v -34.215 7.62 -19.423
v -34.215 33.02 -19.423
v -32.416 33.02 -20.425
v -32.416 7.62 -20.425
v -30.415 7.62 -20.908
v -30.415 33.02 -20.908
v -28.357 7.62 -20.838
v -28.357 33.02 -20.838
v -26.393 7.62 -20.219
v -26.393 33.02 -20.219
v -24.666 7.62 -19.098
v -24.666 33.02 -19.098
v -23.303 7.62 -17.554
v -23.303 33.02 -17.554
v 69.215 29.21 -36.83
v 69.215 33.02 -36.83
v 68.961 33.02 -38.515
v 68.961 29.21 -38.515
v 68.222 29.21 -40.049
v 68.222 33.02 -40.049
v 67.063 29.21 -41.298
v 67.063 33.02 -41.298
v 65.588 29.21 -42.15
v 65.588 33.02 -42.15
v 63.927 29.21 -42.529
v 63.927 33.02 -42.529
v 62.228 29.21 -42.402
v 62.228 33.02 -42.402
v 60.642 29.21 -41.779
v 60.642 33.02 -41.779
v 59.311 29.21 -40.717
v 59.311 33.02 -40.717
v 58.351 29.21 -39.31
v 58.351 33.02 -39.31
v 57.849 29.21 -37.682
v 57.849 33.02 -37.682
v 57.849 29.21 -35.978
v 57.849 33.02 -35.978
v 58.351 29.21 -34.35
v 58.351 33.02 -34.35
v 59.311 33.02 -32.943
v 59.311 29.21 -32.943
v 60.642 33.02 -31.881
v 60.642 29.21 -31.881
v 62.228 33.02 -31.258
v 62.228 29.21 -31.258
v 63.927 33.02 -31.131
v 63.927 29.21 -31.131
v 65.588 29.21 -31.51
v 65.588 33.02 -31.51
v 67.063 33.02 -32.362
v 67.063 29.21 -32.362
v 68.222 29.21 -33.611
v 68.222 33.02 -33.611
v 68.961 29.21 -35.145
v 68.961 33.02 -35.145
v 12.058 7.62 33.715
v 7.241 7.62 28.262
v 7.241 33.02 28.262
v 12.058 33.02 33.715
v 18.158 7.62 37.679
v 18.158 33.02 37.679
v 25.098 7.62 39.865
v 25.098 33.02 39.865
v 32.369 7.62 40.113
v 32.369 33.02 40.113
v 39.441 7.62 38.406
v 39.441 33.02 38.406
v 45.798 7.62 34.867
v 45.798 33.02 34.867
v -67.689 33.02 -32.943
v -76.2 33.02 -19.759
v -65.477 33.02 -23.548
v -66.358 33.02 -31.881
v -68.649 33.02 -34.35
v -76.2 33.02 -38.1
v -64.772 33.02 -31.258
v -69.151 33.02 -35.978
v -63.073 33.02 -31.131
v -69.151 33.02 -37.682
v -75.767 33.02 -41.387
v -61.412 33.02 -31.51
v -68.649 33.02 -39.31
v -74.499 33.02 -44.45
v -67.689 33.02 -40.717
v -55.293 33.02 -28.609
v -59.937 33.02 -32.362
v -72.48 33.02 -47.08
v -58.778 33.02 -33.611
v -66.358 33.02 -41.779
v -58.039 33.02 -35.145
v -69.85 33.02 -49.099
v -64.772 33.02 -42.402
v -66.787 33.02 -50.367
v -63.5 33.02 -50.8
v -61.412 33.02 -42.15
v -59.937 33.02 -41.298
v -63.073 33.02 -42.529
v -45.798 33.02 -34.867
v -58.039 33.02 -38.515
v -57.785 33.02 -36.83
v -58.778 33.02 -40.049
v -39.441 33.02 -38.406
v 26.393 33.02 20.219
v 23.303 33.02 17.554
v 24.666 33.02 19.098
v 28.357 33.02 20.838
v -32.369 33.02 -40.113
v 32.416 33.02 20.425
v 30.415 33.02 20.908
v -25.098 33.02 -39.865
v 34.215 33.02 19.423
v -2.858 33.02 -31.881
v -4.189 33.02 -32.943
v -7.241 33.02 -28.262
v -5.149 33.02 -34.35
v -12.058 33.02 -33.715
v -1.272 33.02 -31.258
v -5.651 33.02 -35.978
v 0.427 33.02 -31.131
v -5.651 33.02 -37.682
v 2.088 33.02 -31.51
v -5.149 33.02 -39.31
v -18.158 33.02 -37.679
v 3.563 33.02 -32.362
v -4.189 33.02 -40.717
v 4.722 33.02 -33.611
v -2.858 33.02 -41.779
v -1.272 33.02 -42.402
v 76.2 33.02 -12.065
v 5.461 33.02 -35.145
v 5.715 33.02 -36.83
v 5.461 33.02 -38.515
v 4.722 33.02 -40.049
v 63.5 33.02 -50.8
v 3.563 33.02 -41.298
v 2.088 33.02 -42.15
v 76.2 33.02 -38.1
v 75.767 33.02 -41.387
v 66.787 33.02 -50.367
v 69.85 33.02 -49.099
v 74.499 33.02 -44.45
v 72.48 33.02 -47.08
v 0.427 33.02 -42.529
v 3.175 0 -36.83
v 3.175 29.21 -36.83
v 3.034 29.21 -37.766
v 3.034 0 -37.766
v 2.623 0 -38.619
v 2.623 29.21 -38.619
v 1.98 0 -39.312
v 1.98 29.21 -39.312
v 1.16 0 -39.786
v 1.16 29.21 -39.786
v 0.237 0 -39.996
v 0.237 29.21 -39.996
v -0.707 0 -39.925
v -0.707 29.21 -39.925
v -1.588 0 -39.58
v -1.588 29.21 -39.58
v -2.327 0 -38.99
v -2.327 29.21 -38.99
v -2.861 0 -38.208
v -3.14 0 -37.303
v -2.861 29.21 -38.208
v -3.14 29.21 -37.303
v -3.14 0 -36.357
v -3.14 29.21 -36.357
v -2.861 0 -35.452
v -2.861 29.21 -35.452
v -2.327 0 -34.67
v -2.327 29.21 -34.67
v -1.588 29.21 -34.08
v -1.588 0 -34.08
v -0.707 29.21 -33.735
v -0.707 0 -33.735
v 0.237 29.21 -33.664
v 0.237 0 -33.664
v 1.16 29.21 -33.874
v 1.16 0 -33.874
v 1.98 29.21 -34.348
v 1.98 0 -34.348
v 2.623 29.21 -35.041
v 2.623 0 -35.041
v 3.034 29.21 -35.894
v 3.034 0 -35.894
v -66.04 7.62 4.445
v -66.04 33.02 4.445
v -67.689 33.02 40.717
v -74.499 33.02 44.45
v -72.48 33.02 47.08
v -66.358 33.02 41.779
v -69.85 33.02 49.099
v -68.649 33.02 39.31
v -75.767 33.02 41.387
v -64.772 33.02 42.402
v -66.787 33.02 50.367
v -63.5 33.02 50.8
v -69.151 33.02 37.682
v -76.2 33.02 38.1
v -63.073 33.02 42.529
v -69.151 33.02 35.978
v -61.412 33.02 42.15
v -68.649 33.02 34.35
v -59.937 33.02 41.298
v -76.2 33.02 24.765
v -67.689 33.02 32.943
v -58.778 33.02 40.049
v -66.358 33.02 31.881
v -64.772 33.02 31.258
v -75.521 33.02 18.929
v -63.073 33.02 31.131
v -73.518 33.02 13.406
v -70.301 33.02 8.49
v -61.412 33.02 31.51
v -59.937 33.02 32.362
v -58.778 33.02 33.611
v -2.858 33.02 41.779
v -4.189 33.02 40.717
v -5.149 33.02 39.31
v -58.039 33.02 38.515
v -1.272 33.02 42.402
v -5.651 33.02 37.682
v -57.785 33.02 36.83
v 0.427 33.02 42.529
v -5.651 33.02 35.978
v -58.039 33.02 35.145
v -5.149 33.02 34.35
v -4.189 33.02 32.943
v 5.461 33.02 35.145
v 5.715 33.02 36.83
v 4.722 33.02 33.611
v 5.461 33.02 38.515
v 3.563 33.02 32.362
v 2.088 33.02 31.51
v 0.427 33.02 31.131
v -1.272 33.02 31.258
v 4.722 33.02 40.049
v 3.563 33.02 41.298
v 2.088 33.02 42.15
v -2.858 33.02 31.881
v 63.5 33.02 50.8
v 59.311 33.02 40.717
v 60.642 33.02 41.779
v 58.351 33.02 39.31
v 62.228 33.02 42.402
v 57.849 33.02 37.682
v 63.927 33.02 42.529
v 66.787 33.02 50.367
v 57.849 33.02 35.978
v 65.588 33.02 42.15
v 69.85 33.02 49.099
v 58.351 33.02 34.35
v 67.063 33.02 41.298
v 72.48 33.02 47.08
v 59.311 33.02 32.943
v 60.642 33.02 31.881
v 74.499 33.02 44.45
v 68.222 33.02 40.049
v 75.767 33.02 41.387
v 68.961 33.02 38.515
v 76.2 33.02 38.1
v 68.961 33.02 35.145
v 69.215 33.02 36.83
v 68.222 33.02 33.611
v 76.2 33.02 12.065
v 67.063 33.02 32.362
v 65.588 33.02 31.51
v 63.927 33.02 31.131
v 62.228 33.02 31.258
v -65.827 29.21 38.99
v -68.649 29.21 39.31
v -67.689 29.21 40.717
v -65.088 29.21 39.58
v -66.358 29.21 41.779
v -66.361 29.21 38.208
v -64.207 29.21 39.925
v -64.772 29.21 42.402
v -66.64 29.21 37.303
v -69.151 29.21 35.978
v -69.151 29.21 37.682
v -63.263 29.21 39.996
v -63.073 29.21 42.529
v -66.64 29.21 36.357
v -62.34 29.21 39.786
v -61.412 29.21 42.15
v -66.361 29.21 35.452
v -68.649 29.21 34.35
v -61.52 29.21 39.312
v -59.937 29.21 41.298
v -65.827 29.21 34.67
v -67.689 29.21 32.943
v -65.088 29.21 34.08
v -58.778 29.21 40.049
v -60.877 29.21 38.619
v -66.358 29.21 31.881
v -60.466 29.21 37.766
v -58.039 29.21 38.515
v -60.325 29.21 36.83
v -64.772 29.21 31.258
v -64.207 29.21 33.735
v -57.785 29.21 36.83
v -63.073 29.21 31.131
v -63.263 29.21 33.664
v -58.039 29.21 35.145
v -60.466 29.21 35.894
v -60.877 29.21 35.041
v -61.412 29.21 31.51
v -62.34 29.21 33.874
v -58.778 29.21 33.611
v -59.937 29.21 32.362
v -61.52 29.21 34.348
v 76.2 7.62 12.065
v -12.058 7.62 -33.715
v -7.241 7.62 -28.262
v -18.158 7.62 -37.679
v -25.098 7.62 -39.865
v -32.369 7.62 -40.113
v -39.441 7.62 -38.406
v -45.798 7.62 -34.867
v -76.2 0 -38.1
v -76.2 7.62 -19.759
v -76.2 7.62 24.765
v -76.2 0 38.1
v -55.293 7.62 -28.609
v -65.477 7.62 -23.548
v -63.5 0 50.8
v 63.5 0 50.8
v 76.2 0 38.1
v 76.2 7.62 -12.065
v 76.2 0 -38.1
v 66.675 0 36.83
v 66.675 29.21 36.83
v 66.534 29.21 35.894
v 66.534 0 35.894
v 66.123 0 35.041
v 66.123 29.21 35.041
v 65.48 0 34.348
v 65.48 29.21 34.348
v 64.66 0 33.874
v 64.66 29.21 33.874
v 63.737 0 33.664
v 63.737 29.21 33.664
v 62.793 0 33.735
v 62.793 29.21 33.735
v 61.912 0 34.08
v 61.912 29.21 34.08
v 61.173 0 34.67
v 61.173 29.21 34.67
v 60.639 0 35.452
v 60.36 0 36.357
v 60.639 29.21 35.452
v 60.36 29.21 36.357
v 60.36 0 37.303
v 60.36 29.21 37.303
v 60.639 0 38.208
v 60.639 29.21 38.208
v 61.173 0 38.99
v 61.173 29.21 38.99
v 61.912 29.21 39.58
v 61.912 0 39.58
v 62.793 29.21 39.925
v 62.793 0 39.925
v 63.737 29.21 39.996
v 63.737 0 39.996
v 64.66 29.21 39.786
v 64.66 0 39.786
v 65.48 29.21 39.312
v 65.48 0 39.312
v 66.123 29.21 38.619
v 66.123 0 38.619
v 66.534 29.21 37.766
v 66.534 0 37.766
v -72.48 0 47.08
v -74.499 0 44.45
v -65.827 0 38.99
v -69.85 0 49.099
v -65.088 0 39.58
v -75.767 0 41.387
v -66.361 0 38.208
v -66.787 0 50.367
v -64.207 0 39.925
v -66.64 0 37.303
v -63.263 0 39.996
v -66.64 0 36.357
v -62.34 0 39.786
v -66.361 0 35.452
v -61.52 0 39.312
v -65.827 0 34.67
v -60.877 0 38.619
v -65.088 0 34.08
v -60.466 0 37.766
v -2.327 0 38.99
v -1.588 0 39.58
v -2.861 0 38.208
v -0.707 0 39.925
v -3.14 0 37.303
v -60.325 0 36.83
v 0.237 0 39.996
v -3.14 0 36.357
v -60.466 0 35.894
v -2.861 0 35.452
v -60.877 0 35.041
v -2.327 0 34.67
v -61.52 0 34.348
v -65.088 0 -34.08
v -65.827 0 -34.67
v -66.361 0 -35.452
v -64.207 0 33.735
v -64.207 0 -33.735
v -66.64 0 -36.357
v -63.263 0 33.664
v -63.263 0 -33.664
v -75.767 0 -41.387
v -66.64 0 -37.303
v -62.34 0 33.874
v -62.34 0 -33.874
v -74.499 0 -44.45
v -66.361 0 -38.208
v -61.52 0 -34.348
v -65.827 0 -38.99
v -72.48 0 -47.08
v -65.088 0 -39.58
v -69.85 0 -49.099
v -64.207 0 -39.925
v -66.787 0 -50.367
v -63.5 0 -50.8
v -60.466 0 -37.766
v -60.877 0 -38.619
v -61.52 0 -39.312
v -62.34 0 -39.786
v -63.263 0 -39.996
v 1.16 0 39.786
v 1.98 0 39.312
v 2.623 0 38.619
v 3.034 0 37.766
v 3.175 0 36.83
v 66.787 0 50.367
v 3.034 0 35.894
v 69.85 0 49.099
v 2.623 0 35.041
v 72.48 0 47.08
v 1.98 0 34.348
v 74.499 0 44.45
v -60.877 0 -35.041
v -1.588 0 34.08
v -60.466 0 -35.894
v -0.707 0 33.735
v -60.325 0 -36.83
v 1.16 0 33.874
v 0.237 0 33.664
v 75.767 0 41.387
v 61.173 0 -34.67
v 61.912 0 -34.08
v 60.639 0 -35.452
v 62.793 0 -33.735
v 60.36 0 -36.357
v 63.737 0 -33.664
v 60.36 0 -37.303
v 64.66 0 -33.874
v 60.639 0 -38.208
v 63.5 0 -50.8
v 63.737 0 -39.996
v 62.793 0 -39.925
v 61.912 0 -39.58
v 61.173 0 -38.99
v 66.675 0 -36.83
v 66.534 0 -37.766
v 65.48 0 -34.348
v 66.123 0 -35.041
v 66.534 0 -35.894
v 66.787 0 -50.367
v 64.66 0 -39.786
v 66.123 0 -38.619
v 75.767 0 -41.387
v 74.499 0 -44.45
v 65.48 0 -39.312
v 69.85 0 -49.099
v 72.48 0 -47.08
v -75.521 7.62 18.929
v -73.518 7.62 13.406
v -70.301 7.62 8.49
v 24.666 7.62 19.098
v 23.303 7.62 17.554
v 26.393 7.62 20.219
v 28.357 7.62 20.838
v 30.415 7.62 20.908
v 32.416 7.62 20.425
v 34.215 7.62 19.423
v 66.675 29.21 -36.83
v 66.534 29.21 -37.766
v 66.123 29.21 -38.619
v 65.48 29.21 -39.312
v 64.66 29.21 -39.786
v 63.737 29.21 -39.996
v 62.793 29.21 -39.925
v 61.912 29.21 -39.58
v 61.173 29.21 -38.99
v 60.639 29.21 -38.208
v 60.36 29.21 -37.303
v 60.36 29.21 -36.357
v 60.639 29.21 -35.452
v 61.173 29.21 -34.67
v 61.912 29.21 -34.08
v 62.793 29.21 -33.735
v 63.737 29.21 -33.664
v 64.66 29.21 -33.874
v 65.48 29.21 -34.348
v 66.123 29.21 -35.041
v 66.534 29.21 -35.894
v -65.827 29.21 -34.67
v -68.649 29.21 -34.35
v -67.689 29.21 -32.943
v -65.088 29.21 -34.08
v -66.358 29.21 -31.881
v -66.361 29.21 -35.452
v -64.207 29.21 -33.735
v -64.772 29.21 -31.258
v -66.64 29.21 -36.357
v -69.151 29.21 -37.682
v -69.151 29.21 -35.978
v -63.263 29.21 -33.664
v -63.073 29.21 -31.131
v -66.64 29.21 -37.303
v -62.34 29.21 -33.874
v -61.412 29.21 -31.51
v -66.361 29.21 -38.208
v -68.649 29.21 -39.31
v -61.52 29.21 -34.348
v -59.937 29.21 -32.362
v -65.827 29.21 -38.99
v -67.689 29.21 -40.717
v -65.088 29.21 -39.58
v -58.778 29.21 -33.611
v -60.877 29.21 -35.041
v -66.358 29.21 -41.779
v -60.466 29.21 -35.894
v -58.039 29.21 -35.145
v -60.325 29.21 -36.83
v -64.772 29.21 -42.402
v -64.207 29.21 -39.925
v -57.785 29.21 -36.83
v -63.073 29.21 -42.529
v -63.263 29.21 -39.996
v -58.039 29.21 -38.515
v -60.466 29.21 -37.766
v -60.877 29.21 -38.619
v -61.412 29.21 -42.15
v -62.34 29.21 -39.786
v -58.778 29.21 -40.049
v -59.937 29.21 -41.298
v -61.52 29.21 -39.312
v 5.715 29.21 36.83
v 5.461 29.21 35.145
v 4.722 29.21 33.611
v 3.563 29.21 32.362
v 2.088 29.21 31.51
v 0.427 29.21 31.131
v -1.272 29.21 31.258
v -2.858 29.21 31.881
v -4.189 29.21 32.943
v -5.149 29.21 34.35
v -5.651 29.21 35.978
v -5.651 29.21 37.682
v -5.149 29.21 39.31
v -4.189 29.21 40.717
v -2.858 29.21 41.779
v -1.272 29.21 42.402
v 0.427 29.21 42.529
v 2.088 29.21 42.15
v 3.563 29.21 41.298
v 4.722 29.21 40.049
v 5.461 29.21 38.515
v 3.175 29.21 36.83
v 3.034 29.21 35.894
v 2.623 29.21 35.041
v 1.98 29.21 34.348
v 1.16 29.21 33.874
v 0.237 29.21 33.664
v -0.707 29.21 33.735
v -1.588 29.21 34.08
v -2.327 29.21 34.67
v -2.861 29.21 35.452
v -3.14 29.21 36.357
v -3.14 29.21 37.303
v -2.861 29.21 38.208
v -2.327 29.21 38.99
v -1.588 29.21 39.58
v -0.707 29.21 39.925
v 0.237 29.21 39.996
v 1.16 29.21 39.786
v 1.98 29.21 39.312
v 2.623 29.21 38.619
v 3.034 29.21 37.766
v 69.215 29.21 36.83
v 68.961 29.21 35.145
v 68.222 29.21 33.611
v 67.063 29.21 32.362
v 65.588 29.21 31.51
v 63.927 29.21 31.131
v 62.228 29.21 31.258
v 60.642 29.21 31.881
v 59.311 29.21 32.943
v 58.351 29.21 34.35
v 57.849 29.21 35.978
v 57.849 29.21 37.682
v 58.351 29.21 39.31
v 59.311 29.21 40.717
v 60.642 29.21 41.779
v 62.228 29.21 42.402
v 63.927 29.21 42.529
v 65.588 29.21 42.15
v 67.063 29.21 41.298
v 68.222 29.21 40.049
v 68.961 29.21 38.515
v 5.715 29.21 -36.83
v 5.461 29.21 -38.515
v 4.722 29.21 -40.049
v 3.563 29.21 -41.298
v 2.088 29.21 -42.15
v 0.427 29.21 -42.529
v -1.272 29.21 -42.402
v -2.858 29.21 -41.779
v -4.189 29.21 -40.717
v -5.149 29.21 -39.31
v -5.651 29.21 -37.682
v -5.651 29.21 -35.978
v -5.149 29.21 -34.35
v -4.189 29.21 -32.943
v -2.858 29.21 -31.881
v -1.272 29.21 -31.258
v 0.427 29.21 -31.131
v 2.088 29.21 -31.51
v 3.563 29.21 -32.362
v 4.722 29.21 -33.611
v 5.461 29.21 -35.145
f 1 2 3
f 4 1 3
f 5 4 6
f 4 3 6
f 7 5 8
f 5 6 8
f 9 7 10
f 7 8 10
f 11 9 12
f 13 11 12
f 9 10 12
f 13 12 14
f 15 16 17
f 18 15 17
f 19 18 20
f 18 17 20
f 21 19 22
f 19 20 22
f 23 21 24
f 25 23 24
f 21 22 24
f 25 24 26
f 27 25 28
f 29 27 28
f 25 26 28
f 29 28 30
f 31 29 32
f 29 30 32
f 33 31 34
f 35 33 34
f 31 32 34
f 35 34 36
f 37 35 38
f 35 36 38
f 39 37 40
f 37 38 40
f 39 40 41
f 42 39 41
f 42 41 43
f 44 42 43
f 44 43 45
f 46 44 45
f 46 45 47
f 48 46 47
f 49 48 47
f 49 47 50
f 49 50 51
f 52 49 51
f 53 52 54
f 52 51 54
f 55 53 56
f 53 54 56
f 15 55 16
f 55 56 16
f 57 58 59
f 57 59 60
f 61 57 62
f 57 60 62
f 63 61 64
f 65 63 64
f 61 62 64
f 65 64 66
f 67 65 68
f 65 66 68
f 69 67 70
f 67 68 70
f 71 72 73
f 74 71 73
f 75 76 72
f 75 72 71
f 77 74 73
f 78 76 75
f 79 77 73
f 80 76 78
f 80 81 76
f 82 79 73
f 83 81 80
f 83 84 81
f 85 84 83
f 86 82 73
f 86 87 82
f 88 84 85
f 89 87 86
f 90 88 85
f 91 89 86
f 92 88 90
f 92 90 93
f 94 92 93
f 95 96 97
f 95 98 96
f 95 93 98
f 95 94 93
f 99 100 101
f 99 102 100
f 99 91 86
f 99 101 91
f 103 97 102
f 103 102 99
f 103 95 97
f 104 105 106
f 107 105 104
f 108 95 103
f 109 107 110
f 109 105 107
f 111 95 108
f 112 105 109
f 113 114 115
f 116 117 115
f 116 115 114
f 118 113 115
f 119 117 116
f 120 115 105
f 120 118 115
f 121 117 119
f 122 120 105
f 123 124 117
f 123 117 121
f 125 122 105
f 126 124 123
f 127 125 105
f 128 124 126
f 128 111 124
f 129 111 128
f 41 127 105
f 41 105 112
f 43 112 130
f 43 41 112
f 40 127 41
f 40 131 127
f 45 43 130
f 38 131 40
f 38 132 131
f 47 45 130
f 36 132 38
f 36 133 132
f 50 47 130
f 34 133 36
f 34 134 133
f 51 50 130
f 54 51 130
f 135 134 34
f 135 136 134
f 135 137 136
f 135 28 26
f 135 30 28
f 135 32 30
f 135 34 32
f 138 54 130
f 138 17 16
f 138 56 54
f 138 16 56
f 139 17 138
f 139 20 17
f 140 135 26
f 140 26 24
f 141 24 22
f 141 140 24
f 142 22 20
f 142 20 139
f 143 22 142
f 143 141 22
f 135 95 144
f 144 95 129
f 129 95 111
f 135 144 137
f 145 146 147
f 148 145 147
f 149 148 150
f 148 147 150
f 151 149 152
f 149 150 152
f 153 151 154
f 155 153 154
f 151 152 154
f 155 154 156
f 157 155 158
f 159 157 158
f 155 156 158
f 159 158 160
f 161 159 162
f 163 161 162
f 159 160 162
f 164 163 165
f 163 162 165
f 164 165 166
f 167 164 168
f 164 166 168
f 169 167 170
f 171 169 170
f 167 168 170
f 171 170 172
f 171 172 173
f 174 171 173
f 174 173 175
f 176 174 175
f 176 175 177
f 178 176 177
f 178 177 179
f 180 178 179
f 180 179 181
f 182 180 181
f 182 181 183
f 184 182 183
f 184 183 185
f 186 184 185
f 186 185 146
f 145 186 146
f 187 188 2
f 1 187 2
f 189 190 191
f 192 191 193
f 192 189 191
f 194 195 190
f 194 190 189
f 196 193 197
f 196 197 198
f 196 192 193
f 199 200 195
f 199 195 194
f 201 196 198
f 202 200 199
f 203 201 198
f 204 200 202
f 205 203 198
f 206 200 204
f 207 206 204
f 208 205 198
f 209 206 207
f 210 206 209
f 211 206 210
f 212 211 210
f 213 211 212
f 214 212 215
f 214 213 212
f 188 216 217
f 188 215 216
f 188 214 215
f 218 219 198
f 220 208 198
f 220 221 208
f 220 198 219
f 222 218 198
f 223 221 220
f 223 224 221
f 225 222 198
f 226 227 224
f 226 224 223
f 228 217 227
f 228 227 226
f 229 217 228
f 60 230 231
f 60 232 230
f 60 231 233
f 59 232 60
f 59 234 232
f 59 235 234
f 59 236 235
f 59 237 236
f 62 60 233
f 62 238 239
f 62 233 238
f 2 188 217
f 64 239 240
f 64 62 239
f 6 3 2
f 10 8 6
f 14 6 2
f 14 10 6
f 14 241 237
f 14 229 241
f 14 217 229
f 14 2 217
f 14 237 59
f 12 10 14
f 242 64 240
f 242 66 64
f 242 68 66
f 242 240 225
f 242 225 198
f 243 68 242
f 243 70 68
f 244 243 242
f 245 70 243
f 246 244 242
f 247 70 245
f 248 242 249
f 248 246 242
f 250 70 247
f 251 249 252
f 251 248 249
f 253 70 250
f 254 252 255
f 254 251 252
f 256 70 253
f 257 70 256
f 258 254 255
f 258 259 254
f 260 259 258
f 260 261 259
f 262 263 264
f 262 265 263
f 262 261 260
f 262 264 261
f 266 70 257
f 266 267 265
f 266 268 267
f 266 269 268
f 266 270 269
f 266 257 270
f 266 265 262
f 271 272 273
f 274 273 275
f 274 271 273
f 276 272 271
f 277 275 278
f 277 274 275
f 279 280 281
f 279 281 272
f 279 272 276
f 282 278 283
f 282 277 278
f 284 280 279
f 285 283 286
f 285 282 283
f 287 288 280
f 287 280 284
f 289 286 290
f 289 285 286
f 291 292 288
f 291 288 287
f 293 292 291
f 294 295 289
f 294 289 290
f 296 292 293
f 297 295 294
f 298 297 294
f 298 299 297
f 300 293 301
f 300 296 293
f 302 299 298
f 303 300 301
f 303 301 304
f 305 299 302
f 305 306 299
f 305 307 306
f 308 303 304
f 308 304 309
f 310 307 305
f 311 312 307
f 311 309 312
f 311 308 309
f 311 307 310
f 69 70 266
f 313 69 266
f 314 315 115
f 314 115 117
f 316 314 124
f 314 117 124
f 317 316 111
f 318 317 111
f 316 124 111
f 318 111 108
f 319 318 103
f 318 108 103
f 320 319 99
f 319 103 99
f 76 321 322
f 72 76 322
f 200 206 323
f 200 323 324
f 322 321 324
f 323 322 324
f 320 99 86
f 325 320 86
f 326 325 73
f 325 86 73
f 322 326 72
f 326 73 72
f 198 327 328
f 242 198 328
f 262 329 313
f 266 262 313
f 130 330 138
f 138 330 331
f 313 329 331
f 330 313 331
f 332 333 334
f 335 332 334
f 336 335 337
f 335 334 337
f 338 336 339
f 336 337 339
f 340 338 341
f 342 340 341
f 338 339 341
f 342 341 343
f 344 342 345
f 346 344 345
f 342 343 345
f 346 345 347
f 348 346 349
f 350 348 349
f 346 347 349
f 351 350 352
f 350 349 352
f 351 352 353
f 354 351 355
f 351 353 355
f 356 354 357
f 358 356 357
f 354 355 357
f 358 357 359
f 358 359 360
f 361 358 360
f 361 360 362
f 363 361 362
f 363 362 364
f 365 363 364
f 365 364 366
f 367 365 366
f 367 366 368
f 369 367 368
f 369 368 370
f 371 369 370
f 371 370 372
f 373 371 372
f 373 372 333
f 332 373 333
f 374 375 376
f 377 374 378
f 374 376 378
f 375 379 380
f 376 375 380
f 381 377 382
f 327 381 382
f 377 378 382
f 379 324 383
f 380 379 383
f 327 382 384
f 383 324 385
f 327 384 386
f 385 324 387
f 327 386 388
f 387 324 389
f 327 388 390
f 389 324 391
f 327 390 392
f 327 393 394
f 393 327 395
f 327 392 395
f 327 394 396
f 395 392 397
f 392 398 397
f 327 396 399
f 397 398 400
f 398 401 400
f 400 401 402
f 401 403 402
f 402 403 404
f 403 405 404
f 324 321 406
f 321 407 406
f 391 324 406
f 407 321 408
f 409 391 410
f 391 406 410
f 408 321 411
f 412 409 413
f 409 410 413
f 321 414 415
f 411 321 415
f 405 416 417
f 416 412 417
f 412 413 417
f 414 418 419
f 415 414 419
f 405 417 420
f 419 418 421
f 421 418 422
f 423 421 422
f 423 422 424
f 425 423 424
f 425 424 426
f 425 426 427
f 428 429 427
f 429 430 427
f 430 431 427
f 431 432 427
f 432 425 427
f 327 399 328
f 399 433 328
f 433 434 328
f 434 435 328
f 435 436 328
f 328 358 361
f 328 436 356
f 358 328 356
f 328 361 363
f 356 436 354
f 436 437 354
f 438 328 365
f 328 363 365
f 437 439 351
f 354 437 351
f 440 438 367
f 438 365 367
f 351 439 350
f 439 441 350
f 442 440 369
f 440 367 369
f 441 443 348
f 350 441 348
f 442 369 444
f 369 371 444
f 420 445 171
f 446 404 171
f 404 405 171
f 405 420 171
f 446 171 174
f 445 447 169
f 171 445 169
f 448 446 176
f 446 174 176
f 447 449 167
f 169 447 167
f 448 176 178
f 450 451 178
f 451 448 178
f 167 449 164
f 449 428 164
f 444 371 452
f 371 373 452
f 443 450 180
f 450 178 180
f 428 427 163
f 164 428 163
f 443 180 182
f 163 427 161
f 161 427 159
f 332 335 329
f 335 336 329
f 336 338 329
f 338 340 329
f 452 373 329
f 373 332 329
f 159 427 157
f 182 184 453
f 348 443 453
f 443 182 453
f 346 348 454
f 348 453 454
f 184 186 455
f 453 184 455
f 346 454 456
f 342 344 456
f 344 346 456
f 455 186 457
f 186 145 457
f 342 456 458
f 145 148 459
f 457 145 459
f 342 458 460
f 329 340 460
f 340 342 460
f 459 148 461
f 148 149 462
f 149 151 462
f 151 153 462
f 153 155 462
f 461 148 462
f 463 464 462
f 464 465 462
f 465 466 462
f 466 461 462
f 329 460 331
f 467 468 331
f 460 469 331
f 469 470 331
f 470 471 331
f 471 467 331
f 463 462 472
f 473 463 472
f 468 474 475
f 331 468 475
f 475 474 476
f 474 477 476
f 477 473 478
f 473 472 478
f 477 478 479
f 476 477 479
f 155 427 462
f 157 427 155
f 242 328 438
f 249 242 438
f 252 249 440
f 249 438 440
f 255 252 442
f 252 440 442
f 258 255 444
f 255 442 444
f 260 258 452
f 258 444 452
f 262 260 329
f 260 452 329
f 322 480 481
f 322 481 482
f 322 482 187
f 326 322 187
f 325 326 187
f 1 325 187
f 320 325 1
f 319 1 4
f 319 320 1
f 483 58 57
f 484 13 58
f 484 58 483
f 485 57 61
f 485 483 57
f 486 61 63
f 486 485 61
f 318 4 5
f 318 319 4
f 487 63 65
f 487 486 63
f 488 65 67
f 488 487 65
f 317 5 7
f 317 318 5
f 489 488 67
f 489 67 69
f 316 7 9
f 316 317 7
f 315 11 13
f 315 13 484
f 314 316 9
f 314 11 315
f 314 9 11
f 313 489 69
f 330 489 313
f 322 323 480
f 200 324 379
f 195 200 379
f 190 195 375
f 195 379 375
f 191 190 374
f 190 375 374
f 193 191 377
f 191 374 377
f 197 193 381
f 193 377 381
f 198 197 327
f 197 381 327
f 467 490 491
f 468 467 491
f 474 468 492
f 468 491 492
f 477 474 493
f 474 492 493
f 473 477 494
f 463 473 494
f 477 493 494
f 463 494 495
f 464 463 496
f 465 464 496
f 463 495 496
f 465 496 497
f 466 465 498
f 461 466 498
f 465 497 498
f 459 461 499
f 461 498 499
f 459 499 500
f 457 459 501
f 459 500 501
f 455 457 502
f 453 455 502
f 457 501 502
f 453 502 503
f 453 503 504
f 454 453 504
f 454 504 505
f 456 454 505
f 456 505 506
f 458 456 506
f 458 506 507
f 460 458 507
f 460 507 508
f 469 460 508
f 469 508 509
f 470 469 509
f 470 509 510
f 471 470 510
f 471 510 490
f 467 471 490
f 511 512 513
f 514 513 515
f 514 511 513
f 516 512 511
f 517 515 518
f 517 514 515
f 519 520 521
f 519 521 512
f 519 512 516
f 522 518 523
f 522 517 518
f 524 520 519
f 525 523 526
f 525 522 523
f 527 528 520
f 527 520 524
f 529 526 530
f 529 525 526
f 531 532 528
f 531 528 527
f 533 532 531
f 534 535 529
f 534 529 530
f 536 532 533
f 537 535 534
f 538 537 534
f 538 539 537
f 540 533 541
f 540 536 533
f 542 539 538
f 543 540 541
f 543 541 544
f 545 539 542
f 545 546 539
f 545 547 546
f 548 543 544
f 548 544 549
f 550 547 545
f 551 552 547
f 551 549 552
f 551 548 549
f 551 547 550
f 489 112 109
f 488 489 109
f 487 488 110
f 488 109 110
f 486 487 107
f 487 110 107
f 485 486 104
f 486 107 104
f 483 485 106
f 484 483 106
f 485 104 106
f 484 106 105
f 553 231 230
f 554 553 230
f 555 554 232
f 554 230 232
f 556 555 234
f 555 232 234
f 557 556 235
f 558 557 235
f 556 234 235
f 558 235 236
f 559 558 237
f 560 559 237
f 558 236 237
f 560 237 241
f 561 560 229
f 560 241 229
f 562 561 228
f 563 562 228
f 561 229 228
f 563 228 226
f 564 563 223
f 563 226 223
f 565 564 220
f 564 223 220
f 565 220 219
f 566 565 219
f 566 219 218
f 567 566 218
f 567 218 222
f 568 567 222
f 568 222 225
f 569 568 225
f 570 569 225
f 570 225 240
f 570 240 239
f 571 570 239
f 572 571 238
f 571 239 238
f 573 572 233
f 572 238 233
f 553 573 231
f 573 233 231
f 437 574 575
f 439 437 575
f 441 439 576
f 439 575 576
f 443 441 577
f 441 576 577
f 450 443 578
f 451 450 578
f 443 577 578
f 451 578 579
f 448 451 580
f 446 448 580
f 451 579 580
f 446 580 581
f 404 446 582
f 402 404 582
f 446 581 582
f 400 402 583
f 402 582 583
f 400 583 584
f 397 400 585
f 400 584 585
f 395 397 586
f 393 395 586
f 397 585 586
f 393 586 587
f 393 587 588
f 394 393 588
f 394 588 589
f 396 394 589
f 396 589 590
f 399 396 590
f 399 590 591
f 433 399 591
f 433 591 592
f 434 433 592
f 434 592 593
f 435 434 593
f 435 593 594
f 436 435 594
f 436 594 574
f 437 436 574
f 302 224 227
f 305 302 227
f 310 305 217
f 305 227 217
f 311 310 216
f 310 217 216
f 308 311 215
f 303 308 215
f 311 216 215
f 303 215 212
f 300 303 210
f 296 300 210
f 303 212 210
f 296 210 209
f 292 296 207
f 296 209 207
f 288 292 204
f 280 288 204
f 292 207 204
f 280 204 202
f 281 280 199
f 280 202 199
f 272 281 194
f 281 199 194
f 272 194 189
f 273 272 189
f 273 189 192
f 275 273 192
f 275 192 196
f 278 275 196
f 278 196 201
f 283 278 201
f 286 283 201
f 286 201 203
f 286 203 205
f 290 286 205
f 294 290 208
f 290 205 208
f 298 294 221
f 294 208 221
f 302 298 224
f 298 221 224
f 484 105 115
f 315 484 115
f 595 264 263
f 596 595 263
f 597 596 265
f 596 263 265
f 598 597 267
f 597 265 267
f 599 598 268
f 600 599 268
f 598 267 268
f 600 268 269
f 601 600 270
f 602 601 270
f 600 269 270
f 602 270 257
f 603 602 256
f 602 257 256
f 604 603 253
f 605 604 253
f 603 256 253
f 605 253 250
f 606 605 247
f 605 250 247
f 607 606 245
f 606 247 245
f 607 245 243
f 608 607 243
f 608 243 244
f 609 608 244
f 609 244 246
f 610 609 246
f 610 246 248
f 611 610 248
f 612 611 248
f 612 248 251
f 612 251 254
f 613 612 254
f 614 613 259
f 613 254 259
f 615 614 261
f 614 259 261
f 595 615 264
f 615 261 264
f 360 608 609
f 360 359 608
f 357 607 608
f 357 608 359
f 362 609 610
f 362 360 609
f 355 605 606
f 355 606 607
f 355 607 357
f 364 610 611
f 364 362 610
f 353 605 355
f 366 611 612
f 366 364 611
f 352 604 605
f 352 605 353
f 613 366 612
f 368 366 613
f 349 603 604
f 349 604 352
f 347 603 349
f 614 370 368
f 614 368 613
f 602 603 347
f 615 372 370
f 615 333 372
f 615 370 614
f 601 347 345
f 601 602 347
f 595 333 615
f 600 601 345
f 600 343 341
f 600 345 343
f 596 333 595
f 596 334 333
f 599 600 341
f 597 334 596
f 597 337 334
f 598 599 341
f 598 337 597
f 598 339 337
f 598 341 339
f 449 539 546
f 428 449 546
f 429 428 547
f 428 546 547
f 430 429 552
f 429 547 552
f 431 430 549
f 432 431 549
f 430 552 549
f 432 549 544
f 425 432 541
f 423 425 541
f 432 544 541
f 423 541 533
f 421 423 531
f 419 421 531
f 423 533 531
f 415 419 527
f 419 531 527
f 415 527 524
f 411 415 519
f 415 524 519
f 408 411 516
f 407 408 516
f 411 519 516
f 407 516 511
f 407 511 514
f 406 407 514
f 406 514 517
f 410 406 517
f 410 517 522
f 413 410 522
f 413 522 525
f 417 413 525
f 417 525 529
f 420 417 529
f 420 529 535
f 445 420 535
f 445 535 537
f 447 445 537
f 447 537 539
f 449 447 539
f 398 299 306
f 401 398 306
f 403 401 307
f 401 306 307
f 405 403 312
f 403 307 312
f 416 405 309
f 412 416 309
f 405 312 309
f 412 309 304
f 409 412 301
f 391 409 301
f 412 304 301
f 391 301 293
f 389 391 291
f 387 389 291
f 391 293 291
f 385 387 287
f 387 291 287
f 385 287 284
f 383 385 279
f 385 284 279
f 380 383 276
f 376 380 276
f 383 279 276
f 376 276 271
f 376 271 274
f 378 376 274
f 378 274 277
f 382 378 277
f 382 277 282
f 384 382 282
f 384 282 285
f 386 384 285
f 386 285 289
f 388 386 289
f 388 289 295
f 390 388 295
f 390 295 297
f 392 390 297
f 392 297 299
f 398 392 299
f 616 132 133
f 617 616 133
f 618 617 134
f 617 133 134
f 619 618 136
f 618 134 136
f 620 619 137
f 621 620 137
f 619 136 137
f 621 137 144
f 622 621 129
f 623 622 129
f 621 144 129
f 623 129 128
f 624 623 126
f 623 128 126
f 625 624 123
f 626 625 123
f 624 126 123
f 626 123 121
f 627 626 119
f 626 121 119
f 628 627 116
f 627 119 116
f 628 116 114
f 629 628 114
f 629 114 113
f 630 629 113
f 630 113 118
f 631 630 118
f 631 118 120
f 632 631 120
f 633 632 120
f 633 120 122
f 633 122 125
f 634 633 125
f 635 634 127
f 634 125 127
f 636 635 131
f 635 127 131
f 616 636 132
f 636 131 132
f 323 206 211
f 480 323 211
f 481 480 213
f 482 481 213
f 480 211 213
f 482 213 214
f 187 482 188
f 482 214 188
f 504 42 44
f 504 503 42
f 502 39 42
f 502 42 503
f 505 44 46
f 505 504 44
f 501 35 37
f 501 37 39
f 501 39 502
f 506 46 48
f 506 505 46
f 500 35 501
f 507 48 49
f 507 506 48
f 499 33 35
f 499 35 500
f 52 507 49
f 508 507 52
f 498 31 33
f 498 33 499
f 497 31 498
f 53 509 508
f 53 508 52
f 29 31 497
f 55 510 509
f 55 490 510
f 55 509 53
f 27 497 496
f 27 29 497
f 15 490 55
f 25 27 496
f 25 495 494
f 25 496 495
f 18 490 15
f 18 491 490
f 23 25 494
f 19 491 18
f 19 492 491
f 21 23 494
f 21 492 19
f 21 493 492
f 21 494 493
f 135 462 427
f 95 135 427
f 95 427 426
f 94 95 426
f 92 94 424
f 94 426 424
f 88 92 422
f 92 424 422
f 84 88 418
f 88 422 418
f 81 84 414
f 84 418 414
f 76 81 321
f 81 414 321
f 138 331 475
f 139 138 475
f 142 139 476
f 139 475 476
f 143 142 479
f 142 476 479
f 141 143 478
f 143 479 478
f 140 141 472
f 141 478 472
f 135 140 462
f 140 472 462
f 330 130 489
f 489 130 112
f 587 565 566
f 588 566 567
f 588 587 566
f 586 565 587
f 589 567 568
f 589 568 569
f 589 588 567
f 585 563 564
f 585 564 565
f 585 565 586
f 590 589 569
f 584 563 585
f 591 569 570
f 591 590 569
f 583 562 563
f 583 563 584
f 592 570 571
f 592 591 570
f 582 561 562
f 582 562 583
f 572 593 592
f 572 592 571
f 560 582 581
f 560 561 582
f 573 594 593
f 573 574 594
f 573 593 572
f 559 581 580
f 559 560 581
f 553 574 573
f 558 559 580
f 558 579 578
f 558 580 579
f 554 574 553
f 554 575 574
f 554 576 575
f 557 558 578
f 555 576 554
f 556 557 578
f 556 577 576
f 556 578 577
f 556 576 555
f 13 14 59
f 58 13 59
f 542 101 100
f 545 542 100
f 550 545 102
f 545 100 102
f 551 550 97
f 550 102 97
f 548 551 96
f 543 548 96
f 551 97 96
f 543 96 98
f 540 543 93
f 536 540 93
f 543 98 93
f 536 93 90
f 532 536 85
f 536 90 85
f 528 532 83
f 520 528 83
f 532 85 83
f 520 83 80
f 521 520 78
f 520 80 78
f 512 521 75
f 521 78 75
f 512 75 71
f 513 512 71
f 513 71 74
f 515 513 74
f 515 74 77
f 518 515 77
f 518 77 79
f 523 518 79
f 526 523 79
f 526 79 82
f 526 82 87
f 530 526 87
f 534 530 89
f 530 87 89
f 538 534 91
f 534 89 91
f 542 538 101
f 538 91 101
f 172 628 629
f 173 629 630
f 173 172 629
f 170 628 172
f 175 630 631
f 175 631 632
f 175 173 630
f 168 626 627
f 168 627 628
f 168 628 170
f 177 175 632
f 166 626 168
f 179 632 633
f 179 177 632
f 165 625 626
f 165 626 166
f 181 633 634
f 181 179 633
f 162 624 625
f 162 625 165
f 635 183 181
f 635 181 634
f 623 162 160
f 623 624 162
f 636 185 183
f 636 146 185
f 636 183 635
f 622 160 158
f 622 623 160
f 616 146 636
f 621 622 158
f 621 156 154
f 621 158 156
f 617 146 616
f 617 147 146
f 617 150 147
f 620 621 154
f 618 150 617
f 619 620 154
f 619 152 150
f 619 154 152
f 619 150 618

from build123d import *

# Parameters (mm, degrees)
BOSS_EXTRUDE1_DEPTH = 33.02
CUT_EXTRUDE1_DEPTH  = 25.4
SKETCH3_R           = 3.175
CUT_EXTRUDE2_DEPTH  = 34.02
SKETCH4_R           = 5.715
CUT_EXTRUDE3_DEPTH  = 3.81


with BuildPart() as part:
    # Sketch1 → Boss-Extrude1 (new body)
    with BuildSketch(Plane(origin=(0, 0, 0), x_dir=(1, 0, 0), z_dir=(0, 1, 0))):
        with BuildLine():
            Line((-63.5, -50.8), (63.5, -50.8))
            ThreePointArc((63.5, -50.8), (72.480256121, -47.080256121), (76.2, -38.1))
            Line((76.2, -38.1), (76.2, 38.1))
            ThreePointArc((76.2, 38.1), (72.480256121, 47.080256121), (63.5, 50.8))
            Line((63.5, 50.8), (-63.5, 50.8))
            ThreePointArc((-63.5, 50.8), (-72.480256121, 47.080256121), (-76.2, 38.1))
            Line((-76.2, 38.1), (-76.2, -38.1))
            ThreePointArc((-76.2, -38.1), (-72.480256121, -47.080256121), (-63.5, -50.8))
        make_face()
    extrude(amount=BOSS_EXTRUDE1_DEPTH)

    # Sketch2 → Cut-Extrude1 (cut)
    with BuildSketch(Plane(origin=(0, 33.02, 0), x_dir=(1, 0, 0), z_dir=(0, 1, 0))):
        with BuildLine():
            Line((-76.2, 19.759327566), (-76.2, -24.765))
            ThreePointArc((-76.2, -24.765), (-73.518450651, -13.405774674), (-66.04, -4.445))
            Line((-66.04, -4.445), (-34.215351473, 19.423486395))
            ThreePointArc((-34.215351473, 19.423486395), (-28.356838342, 20.838097819), (-23.30312823, 17.55430189))
            Line((-23.30312823, 17.55430189), (7.241229349, -28.262234478))
            ThreePointArc((7.241229349, -28.262234478), (25.097671742, -39.864980093), (45.797751473, -34.866686395))
            Line((45.797751473, -34.866686395), (76.2, -12.065))
            Line((76.2, -12.065), (76.2, 12.065))
            Line((76.2, 12.065), (34.215351473, -19.423486395))
            ThreePointArc((34.215351473, -19.423486395), (28.356838342, -20.838097819), (23.30312823, -17.55430189))
            Line((23.30312823, -17.55430189), (-7.241229349, 28.262234478))
            ThreePointArc((-7.241229349, 28.262234478), (-25.097671742, 39.864980093), (-45.797751473, 34.866686395))
            ThreePointArc((-45.797751473, 34.866686395), (-60.308353779, 25.923391468), (-76.2, 19.759327566))
        make_face()
    extrude(amount=-CUT_EXTRUDE1_DEPTH, mode=Mode.SUBTRACT)

    # Sketch3 → Cut-Extrude2 (cut, through all)
    with BuildSketch(Plane(origin=(0, 33.02, 0), x_dir=(1, 0, 0), z_dir=(0, 1, 0))):
        with Locations((63.5, 36.83)):
            Circle(SKETCH3_R)
        with Locations((0, 36.83)):
            Circle(SKETCH3_R)
        with Locations((-63.5, 36.83)):
            Circle(SKETCH3_R)
        with Locations((63.5, -36.83)):
            Circle(SKETCH3_R)
        with Locations((0, -36.83)):
            Circle(SKETCH3_R)
        with Locations((-63.5, -36.83)):
            Circle(SKETCH3_R)
    extrude(amount=-CUT_EXTRUDE2_DEPTH, mode=Mode.SUBTRACT)

    # Sketch4 → Cut-Extrude3 (cut)
    with BuildSketch(Plane(origin=(0, 33.02, 0), x_dir=(1, 0, 0), z_dir=(0, 1, 0))):
        with Locations((-63.5, 36.83)):
            Circle(SKETCH4_R)
        with Locations((0, 36.83)):
            Circle(SKETCH4_R)
        with Locations((63.5, 36.83)):
            Circle(SKETCH4_R)
        with Locations((63.5, -36.83)):
            Circle(SKETCH4_R)
        with Locations((0, -36.83)):
            Circle(SKETCH4_R)
        with Locations((-63.5, -36.83)):
            Circle(SKETCH4_R)
    extrude(amount=-CUT_EXTRUDE3_DEPTH, mode=Mode.SUBTRACT)


solid = part.part
